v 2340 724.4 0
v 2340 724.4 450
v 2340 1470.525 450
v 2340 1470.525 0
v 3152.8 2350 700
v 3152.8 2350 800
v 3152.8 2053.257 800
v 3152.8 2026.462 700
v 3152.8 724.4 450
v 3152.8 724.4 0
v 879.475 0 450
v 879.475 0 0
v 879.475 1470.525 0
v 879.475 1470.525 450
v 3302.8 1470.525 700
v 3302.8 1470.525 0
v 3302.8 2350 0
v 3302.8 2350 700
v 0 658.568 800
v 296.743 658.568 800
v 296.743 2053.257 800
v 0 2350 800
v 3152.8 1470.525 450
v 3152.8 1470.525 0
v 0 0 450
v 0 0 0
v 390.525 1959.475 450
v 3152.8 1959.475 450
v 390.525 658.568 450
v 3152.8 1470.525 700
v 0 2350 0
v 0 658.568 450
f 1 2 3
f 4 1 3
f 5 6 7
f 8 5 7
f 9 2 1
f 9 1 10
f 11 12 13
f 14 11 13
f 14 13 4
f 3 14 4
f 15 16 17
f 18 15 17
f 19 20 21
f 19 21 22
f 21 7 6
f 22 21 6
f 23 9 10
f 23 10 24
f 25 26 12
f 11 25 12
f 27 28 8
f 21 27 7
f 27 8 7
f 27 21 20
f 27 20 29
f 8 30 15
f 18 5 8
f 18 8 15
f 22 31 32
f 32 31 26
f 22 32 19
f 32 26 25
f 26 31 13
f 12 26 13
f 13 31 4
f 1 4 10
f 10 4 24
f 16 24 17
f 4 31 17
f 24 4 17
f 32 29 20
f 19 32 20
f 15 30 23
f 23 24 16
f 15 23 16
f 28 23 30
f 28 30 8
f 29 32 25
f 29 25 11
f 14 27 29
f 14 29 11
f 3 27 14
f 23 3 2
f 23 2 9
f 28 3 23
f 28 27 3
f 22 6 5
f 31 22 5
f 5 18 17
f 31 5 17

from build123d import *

# Parameters (mm, degrees)
F1_DEPTH  = 450
F2_W      = 879.475
F2_H      = 150
F2_W_2    = 150
F2_H_2    = 879.475
F3_DEPTH  = 250
F5_DEPTH  = 2200
F8_W      = 658.5683822632
F8_H      = 350
F9_DEPTH  = 879.476
F10_W     = 812.8
F10_H     = 746.125
F11_DEPTH = 450


with BuildPart() as f1:
    # F0 (on Top) → F1 (new body)
    with BuildSketch(Plane.XY):
        Polygon((0, 2350), (0, 0), (879.475, 0), (879.475, 1470.525), (3302.8, 1470.525), (3302.8, 2350), align=None)
    extrude(amount=F1_DEPTH)

    # F2 (on face) → F3 (join)
    with BuildSketch(Plane.XY.offset(450)):
        with Locations((439.7375, 75)):
            Rectangle(F2_W, F2_H)
        with Locations((3227.8, 1910.2625)):
            Rectangle(F2_W_2, F2_H_2)
    extrude(amount=F3_DEPTH)

    # F4 (on face) → F5 (join, through all)
    with BuildSketch(Plane(origin=(0, 150, 0), x_dir=(-1, 0, 0), z_dir=(0, 1, 0))):
        Polygon((-390.525, 450), (0, 450), (0, 800), (-296.7427826491, 800), align=None)
    extrude(amount=F5_DEPTH)

    # F6 (on face) → F7 (join, up to the next surface of F1)
    with BuildSketch(Plane(origin=(3152.8, 0, 0), x_dir=(0, -1, 0), z_dir=(-1, 0, 0))):
        Polygon((-2350, 800), (-2350, 450), (-1959.475, 450), (-2053.2572173509, 800), align=None)
    extrude(until=Until.NEXT)

    # F8 (on face) → F9 (cut, through all)
    with BuildSketch(Plane.YZ.offset(879.475)):
        with Locations((329.2841911316, 625)):
            Rectangle(F8_W, F8_H)
    extrude(amount=-F9_DEPTH, mode=Mode.SUBTRACT)

    # F10 (on face) → F11 (join, through all)
    with BuildSketch(Plane.XY.offset(450)):
        with Locations((2746.4, 1097.4625)):
            Rectangle(F10_W, F10_H)
    extrude(amount=-F11_DEPTH)


solid = f1.part
